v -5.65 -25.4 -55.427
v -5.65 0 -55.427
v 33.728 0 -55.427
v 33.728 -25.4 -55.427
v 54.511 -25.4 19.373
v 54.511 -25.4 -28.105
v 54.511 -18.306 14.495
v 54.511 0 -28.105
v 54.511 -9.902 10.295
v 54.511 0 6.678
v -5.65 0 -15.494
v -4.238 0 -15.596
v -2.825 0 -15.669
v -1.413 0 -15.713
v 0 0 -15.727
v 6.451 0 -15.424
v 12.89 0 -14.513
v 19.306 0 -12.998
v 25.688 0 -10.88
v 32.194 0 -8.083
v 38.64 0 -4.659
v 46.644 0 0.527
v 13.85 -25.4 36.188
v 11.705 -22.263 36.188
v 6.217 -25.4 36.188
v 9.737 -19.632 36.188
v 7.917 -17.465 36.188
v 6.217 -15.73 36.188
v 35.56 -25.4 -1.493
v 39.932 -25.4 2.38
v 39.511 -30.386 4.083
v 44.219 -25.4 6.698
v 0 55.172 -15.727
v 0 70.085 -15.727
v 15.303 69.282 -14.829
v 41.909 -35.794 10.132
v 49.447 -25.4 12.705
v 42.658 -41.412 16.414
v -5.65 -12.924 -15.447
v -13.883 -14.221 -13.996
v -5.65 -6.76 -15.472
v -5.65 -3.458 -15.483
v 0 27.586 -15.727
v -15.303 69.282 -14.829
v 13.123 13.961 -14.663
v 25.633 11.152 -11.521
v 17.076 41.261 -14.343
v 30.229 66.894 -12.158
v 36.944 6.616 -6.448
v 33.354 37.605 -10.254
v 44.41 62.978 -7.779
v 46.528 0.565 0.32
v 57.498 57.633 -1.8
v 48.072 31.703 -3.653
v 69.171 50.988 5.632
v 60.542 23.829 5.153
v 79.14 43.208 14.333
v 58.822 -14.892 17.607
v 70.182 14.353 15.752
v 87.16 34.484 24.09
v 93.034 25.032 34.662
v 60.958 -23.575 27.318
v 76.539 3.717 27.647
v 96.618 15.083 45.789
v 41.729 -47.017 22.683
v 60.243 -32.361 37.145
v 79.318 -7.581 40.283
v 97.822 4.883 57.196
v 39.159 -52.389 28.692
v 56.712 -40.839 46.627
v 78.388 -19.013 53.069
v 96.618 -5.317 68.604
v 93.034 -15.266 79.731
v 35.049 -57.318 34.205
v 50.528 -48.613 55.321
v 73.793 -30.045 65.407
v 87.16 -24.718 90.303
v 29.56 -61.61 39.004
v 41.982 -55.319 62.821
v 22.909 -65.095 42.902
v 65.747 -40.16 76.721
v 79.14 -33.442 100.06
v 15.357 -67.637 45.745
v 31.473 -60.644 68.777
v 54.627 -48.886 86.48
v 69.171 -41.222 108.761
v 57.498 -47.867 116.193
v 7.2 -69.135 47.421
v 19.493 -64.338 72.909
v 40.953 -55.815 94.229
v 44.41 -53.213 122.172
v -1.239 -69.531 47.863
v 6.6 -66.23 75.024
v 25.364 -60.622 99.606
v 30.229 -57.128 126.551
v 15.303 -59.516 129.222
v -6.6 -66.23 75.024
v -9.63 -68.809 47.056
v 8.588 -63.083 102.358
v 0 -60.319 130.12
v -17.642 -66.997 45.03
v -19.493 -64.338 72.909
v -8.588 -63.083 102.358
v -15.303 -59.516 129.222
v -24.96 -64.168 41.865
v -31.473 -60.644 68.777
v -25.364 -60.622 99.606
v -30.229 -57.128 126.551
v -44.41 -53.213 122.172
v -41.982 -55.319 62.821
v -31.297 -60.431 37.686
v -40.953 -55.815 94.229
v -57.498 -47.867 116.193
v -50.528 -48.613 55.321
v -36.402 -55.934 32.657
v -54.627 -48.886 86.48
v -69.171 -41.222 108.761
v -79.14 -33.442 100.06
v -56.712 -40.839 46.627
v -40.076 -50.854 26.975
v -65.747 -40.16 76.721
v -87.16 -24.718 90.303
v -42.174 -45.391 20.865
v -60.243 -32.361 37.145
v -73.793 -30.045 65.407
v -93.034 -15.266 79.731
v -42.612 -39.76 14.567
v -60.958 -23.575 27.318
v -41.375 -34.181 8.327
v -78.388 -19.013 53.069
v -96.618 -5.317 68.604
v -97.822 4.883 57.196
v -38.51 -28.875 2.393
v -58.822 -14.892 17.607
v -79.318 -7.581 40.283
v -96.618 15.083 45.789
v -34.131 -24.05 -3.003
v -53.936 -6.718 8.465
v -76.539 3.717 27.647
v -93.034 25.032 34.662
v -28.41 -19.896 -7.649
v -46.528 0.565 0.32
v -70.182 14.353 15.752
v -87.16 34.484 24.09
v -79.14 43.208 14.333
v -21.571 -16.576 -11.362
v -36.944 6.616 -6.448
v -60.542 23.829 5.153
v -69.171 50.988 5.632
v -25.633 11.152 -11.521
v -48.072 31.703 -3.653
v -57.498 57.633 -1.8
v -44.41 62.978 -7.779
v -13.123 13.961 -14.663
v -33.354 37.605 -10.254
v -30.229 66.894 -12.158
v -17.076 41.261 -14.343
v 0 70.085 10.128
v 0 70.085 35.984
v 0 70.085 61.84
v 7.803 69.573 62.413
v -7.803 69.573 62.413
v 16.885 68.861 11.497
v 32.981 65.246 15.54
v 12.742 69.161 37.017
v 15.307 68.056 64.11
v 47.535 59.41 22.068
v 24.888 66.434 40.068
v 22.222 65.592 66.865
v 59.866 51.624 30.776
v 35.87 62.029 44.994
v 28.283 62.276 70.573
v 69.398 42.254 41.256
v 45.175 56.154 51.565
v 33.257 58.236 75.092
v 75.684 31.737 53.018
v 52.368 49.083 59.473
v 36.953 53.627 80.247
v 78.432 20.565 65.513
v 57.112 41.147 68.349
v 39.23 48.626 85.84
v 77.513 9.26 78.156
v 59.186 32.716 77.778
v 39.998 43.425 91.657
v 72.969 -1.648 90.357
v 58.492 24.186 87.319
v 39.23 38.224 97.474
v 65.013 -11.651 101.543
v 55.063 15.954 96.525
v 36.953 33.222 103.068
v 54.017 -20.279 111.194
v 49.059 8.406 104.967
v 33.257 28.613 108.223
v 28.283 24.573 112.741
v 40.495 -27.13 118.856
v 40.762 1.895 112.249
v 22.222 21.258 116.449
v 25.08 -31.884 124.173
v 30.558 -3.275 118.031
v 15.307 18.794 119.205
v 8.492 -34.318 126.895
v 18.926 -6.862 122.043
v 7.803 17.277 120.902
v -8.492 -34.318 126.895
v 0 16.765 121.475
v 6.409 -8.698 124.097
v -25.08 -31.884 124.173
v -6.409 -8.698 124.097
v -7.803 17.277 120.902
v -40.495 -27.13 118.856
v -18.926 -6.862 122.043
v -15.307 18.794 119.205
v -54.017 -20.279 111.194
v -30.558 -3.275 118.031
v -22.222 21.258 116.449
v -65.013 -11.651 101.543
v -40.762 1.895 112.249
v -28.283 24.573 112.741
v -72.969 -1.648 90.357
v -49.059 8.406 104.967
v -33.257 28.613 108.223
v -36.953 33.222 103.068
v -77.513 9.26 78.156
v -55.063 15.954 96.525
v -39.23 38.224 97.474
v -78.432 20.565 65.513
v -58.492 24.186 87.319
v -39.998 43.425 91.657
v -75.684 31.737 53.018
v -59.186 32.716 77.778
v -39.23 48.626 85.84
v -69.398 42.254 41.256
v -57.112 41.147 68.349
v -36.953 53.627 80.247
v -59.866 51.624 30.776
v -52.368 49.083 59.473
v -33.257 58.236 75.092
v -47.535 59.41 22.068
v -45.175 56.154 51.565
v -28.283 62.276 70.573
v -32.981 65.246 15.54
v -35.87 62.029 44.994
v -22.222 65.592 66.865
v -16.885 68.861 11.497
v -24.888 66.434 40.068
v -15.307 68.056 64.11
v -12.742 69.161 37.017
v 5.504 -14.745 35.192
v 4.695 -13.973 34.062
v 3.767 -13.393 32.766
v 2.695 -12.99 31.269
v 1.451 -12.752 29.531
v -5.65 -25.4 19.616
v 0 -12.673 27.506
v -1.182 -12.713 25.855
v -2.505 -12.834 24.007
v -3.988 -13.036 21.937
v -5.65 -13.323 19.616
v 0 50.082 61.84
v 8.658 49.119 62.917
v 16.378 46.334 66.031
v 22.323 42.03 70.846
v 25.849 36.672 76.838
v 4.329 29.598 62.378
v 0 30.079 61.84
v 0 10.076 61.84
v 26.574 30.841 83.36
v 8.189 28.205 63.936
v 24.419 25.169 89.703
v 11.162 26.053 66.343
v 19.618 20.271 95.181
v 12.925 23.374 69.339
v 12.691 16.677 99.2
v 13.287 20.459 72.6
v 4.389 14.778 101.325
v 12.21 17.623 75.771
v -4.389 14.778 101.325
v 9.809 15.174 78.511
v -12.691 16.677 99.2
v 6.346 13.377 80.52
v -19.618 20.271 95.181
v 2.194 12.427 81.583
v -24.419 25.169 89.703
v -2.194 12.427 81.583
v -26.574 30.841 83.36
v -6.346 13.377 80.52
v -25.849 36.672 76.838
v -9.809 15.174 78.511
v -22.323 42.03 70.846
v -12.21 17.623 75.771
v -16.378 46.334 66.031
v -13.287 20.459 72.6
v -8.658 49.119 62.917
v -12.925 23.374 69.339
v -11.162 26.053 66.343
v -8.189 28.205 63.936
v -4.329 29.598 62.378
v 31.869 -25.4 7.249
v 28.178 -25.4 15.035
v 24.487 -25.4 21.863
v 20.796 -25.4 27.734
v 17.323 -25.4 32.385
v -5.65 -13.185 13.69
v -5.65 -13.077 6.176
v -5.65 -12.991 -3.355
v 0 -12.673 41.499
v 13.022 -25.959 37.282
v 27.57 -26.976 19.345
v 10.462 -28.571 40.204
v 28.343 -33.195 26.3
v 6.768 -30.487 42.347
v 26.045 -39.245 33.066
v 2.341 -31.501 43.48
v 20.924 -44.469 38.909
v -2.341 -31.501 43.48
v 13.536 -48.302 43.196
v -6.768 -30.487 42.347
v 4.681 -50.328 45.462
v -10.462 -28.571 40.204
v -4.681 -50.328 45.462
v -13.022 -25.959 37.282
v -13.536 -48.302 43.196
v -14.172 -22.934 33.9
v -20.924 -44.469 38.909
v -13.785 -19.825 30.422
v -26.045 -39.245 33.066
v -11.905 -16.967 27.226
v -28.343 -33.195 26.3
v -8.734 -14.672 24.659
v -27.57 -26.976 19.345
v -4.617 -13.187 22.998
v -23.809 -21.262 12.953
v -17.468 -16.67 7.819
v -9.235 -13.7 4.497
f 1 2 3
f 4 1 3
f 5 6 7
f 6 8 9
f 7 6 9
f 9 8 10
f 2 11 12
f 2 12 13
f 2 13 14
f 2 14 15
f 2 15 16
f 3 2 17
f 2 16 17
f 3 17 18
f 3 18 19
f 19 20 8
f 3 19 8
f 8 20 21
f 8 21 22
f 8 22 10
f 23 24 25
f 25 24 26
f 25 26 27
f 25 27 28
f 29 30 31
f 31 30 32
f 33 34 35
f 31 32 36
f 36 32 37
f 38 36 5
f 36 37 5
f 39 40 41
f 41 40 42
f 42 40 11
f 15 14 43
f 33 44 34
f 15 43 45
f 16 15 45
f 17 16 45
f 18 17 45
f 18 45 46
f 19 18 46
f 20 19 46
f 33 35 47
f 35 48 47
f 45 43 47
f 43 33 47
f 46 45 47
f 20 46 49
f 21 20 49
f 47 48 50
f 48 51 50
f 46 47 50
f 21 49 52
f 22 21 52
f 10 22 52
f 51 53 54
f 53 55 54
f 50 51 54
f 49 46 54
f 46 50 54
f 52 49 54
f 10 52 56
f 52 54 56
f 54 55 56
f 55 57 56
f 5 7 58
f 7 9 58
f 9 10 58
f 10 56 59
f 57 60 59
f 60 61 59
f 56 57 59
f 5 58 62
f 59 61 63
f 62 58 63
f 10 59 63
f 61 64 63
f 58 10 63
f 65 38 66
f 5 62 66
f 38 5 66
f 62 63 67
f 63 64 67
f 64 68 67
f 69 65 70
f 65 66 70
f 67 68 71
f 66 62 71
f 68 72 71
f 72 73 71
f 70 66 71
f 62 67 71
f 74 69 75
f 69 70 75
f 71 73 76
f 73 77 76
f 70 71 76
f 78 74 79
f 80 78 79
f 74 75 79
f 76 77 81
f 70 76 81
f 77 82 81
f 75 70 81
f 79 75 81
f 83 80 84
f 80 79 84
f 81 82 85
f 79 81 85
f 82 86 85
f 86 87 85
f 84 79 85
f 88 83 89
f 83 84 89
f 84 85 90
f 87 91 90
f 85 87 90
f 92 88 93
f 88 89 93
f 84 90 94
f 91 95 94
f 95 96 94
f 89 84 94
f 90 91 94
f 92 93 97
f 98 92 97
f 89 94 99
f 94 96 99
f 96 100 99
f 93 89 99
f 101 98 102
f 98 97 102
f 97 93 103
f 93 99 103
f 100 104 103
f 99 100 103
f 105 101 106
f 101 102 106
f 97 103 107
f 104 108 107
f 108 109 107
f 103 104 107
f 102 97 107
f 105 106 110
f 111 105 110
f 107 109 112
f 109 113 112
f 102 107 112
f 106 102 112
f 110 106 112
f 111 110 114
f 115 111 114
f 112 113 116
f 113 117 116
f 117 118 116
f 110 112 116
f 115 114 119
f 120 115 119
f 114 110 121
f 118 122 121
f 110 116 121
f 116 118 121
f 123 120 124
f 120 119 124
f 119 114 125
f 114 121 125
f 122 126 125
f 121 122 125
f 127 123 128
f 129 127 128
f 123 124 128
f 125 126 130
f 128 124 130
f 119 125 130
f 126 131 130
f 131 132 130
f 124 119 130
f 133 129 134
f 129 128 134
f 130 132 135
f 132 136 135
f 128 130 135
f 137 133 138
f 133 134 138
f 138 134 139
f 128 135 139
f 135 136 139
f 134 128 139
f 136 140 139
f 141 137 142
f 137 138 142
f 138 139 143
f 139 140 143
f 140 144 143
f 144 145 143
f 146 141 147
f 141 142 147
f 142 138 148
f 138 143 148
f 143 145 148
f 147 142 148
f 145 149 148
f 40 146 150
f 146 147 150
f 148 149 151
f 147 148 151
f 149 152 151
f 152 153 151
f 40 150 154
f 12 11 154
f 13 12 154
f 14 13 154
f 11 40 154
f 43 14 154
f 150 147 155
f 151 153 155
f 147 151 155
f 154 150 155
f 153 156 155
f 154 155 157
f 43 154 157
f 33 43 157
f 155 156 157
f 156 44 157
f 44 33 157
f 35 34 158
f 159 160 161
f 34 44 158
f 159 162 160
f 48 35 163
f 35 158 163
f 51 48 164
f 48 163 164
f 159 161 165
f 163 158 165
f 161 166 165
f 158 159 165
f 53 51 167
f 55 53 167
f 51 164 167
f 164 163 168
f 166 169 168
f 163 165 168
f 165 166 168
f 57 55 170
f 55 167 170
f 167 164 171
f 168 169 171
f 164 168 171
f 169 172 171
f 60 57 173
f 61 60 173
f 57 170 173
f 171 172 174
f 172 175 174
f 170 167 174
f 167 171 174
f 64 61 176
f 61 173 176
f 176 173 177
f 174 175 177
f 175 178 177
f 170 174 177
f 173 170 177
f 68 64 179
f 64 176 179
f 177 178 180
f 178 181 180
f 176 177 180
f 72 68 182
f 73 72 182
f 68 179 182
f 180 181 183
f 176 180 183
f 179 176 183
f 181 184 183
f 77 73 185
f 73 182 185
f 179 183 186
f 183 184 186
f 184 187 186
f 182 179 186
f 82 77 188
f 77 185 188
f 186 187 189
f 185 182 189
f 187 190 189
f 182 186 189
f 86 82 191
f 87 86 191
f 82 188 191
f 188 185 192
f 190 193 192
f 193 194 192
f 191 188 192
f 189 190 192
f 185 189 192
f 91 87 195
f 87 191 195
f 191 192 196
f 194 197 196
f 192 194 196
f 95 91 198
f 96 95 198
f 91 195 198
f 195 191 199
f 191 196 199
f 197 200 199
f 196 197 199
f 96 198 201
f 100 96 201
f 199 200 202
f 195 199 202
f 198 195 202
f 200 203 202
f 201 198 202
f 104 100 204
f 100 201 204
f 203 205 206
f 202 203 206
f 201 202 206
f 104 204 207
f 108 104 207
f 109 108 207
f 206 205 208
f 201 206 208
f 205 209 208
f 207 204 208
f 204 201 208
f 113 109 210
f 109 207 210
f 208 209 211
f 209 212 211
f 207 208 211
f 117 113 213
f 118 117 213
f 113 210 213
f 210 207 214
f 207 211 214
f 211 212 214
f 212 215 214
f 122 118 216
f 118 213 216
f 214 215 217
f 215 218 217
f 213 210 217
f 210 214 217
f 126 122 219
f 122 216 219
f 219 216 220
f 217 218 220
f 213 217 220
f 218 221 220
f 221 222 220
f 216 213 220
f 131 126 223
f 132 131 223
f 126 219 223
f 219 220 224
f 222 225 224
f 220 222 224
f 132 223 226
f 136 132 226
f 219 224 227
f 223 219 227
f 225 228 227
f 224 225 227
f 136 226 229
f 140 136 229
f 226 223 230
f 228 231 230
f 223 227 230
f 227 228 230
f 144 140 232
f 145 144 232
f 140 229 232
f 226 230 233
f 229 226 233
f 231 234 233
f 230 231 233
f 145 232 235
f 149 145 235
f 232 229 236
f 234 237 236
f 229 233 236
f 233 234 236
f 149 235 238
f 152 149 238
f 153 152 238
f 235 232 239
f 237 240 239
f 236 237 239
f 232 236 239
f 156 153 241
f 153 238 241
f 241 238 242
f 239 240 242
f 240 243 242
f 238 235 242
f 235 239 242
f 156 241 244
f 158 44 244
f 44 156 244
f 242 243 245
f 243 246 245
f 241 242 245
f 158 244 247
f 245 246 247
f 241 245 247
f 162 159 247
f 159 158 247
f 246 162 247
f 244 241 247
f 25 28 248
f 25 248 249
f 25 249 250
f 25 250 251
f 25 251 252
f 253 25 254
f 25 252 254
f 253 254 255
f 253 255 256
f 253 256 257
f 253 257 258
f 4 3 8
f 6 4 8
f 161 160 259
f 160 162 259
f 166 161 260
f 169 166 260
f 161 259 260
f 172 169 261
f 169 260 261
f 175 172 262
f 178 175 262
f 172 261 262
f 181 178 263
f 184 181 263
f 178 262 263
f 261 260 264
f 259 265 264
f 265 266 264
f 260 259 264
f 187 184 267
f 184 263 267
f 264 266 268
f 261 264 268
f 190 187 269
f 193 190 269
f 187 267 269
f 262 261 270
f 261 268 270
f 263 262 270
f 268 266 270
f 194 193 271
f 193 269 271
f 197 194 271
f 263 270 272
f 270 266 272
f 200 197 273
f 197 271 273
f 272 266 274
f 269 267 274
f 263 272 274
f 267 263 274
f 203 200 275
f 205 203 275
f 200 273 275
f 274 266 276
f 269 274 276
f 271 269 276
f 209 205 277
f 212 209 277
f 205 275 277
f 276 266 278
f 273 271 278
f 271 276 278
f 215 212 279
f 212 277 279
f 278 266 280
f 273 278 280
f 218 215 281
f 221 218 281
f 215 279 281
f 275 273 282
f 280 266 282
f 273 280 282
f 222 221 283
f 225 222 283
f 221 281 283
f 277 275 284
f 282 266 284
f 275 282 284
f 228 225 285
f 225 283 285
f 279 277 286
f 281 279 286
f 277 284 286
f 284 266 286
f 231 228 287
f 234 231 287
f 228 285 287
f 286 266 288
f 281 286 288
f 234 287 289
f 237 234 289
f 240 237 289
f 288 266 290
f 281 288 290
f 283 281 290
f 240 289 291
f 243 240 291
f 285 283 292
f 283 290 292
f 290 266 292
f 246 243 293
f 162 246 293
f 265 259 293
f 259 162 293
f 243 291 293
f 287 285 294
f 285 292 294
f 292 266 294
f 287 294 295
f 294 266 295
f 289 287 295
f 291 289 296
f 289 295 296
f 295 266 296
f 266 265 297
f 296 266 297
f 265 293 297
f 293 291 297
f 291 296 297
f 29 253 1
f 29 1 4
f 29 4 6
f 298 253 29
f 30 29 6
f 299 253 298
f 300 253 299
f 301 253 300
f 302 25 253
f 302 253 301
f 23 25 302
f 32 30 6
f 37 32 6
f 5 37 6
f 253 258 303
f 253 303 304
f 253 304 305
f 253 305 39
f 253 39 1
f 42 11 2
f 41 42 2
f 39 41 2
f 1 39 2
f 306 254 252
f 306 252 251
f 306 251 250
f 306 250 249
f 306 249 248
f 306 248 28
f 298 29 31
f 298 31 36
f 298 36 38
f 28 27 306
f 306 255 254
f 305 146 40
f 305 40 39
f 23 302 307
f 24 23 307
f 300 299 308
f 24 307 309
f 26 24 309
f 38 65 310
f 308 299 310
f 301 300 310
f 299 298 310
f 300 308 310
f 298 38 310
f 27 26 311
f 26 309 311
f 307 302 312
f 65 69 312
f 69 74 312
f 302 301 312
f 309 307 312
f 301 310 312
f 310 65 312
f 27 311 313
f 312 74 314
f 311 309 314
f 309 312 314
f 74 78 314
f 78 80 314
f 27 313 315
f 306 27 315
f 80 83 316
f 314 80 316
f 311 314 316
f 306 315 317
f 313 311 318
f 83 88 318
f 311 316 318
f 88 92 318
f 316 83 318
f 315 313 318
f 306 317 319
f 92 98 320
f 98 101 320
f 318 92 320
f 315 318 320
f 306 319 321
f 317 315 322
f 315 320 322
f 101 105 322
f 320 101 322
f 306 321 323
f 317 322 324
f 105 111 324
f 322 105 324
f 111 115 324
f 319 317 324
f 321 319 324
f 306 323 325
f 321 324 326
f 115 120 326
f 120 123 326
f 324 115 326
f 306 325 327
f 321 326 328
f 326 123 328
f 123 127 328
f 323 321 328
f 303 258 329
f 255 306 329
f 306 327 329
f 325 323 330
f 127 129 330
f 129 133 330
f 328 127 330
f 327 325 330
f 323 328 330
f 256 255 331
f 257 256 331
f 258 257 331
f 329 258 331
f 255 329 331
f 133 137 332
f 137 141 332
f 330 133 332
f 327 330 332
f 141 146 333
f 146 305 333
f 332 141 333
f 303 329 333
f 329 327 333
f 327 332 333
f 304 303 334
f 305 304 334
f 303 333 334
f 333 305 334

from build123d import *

# Parameters (mm, degrees)
F1_DEPTH = 25.4


with BuildPart() as f1:
    # F0 (on Front) → F1 (new body)
    with BuildSketch(Plane.XZ):
        Polygon((54.5106306672, 36.1877307296), (6.2173682239, 36.1877307296), (-5.6495610625, 19.6164111685), (-5.6495610625, -55.4267726839), (33.7284366412, -55.4267726839), (54.5106306672, -28.1047300409), align=None)
    extrude(amount=F1_DEPTH)

    # F2 (on Right) → F3 (revolve)
    with BuildSketch(Plane.YZ):
        Polygon((70.0851008296, 61.8397891521), (10.0763916288, 61.8397891521), (-12.6733398065, 41.4988532085), (-12.6733398065, -15.7271567732), (70.0851008296, -15.7271567732), align=None)
    revolve(axis=Axis((0, -4.0846643969, 49.1781393066), (0, -0.7454706515, -0.6665384518)))


solid = f1.part
